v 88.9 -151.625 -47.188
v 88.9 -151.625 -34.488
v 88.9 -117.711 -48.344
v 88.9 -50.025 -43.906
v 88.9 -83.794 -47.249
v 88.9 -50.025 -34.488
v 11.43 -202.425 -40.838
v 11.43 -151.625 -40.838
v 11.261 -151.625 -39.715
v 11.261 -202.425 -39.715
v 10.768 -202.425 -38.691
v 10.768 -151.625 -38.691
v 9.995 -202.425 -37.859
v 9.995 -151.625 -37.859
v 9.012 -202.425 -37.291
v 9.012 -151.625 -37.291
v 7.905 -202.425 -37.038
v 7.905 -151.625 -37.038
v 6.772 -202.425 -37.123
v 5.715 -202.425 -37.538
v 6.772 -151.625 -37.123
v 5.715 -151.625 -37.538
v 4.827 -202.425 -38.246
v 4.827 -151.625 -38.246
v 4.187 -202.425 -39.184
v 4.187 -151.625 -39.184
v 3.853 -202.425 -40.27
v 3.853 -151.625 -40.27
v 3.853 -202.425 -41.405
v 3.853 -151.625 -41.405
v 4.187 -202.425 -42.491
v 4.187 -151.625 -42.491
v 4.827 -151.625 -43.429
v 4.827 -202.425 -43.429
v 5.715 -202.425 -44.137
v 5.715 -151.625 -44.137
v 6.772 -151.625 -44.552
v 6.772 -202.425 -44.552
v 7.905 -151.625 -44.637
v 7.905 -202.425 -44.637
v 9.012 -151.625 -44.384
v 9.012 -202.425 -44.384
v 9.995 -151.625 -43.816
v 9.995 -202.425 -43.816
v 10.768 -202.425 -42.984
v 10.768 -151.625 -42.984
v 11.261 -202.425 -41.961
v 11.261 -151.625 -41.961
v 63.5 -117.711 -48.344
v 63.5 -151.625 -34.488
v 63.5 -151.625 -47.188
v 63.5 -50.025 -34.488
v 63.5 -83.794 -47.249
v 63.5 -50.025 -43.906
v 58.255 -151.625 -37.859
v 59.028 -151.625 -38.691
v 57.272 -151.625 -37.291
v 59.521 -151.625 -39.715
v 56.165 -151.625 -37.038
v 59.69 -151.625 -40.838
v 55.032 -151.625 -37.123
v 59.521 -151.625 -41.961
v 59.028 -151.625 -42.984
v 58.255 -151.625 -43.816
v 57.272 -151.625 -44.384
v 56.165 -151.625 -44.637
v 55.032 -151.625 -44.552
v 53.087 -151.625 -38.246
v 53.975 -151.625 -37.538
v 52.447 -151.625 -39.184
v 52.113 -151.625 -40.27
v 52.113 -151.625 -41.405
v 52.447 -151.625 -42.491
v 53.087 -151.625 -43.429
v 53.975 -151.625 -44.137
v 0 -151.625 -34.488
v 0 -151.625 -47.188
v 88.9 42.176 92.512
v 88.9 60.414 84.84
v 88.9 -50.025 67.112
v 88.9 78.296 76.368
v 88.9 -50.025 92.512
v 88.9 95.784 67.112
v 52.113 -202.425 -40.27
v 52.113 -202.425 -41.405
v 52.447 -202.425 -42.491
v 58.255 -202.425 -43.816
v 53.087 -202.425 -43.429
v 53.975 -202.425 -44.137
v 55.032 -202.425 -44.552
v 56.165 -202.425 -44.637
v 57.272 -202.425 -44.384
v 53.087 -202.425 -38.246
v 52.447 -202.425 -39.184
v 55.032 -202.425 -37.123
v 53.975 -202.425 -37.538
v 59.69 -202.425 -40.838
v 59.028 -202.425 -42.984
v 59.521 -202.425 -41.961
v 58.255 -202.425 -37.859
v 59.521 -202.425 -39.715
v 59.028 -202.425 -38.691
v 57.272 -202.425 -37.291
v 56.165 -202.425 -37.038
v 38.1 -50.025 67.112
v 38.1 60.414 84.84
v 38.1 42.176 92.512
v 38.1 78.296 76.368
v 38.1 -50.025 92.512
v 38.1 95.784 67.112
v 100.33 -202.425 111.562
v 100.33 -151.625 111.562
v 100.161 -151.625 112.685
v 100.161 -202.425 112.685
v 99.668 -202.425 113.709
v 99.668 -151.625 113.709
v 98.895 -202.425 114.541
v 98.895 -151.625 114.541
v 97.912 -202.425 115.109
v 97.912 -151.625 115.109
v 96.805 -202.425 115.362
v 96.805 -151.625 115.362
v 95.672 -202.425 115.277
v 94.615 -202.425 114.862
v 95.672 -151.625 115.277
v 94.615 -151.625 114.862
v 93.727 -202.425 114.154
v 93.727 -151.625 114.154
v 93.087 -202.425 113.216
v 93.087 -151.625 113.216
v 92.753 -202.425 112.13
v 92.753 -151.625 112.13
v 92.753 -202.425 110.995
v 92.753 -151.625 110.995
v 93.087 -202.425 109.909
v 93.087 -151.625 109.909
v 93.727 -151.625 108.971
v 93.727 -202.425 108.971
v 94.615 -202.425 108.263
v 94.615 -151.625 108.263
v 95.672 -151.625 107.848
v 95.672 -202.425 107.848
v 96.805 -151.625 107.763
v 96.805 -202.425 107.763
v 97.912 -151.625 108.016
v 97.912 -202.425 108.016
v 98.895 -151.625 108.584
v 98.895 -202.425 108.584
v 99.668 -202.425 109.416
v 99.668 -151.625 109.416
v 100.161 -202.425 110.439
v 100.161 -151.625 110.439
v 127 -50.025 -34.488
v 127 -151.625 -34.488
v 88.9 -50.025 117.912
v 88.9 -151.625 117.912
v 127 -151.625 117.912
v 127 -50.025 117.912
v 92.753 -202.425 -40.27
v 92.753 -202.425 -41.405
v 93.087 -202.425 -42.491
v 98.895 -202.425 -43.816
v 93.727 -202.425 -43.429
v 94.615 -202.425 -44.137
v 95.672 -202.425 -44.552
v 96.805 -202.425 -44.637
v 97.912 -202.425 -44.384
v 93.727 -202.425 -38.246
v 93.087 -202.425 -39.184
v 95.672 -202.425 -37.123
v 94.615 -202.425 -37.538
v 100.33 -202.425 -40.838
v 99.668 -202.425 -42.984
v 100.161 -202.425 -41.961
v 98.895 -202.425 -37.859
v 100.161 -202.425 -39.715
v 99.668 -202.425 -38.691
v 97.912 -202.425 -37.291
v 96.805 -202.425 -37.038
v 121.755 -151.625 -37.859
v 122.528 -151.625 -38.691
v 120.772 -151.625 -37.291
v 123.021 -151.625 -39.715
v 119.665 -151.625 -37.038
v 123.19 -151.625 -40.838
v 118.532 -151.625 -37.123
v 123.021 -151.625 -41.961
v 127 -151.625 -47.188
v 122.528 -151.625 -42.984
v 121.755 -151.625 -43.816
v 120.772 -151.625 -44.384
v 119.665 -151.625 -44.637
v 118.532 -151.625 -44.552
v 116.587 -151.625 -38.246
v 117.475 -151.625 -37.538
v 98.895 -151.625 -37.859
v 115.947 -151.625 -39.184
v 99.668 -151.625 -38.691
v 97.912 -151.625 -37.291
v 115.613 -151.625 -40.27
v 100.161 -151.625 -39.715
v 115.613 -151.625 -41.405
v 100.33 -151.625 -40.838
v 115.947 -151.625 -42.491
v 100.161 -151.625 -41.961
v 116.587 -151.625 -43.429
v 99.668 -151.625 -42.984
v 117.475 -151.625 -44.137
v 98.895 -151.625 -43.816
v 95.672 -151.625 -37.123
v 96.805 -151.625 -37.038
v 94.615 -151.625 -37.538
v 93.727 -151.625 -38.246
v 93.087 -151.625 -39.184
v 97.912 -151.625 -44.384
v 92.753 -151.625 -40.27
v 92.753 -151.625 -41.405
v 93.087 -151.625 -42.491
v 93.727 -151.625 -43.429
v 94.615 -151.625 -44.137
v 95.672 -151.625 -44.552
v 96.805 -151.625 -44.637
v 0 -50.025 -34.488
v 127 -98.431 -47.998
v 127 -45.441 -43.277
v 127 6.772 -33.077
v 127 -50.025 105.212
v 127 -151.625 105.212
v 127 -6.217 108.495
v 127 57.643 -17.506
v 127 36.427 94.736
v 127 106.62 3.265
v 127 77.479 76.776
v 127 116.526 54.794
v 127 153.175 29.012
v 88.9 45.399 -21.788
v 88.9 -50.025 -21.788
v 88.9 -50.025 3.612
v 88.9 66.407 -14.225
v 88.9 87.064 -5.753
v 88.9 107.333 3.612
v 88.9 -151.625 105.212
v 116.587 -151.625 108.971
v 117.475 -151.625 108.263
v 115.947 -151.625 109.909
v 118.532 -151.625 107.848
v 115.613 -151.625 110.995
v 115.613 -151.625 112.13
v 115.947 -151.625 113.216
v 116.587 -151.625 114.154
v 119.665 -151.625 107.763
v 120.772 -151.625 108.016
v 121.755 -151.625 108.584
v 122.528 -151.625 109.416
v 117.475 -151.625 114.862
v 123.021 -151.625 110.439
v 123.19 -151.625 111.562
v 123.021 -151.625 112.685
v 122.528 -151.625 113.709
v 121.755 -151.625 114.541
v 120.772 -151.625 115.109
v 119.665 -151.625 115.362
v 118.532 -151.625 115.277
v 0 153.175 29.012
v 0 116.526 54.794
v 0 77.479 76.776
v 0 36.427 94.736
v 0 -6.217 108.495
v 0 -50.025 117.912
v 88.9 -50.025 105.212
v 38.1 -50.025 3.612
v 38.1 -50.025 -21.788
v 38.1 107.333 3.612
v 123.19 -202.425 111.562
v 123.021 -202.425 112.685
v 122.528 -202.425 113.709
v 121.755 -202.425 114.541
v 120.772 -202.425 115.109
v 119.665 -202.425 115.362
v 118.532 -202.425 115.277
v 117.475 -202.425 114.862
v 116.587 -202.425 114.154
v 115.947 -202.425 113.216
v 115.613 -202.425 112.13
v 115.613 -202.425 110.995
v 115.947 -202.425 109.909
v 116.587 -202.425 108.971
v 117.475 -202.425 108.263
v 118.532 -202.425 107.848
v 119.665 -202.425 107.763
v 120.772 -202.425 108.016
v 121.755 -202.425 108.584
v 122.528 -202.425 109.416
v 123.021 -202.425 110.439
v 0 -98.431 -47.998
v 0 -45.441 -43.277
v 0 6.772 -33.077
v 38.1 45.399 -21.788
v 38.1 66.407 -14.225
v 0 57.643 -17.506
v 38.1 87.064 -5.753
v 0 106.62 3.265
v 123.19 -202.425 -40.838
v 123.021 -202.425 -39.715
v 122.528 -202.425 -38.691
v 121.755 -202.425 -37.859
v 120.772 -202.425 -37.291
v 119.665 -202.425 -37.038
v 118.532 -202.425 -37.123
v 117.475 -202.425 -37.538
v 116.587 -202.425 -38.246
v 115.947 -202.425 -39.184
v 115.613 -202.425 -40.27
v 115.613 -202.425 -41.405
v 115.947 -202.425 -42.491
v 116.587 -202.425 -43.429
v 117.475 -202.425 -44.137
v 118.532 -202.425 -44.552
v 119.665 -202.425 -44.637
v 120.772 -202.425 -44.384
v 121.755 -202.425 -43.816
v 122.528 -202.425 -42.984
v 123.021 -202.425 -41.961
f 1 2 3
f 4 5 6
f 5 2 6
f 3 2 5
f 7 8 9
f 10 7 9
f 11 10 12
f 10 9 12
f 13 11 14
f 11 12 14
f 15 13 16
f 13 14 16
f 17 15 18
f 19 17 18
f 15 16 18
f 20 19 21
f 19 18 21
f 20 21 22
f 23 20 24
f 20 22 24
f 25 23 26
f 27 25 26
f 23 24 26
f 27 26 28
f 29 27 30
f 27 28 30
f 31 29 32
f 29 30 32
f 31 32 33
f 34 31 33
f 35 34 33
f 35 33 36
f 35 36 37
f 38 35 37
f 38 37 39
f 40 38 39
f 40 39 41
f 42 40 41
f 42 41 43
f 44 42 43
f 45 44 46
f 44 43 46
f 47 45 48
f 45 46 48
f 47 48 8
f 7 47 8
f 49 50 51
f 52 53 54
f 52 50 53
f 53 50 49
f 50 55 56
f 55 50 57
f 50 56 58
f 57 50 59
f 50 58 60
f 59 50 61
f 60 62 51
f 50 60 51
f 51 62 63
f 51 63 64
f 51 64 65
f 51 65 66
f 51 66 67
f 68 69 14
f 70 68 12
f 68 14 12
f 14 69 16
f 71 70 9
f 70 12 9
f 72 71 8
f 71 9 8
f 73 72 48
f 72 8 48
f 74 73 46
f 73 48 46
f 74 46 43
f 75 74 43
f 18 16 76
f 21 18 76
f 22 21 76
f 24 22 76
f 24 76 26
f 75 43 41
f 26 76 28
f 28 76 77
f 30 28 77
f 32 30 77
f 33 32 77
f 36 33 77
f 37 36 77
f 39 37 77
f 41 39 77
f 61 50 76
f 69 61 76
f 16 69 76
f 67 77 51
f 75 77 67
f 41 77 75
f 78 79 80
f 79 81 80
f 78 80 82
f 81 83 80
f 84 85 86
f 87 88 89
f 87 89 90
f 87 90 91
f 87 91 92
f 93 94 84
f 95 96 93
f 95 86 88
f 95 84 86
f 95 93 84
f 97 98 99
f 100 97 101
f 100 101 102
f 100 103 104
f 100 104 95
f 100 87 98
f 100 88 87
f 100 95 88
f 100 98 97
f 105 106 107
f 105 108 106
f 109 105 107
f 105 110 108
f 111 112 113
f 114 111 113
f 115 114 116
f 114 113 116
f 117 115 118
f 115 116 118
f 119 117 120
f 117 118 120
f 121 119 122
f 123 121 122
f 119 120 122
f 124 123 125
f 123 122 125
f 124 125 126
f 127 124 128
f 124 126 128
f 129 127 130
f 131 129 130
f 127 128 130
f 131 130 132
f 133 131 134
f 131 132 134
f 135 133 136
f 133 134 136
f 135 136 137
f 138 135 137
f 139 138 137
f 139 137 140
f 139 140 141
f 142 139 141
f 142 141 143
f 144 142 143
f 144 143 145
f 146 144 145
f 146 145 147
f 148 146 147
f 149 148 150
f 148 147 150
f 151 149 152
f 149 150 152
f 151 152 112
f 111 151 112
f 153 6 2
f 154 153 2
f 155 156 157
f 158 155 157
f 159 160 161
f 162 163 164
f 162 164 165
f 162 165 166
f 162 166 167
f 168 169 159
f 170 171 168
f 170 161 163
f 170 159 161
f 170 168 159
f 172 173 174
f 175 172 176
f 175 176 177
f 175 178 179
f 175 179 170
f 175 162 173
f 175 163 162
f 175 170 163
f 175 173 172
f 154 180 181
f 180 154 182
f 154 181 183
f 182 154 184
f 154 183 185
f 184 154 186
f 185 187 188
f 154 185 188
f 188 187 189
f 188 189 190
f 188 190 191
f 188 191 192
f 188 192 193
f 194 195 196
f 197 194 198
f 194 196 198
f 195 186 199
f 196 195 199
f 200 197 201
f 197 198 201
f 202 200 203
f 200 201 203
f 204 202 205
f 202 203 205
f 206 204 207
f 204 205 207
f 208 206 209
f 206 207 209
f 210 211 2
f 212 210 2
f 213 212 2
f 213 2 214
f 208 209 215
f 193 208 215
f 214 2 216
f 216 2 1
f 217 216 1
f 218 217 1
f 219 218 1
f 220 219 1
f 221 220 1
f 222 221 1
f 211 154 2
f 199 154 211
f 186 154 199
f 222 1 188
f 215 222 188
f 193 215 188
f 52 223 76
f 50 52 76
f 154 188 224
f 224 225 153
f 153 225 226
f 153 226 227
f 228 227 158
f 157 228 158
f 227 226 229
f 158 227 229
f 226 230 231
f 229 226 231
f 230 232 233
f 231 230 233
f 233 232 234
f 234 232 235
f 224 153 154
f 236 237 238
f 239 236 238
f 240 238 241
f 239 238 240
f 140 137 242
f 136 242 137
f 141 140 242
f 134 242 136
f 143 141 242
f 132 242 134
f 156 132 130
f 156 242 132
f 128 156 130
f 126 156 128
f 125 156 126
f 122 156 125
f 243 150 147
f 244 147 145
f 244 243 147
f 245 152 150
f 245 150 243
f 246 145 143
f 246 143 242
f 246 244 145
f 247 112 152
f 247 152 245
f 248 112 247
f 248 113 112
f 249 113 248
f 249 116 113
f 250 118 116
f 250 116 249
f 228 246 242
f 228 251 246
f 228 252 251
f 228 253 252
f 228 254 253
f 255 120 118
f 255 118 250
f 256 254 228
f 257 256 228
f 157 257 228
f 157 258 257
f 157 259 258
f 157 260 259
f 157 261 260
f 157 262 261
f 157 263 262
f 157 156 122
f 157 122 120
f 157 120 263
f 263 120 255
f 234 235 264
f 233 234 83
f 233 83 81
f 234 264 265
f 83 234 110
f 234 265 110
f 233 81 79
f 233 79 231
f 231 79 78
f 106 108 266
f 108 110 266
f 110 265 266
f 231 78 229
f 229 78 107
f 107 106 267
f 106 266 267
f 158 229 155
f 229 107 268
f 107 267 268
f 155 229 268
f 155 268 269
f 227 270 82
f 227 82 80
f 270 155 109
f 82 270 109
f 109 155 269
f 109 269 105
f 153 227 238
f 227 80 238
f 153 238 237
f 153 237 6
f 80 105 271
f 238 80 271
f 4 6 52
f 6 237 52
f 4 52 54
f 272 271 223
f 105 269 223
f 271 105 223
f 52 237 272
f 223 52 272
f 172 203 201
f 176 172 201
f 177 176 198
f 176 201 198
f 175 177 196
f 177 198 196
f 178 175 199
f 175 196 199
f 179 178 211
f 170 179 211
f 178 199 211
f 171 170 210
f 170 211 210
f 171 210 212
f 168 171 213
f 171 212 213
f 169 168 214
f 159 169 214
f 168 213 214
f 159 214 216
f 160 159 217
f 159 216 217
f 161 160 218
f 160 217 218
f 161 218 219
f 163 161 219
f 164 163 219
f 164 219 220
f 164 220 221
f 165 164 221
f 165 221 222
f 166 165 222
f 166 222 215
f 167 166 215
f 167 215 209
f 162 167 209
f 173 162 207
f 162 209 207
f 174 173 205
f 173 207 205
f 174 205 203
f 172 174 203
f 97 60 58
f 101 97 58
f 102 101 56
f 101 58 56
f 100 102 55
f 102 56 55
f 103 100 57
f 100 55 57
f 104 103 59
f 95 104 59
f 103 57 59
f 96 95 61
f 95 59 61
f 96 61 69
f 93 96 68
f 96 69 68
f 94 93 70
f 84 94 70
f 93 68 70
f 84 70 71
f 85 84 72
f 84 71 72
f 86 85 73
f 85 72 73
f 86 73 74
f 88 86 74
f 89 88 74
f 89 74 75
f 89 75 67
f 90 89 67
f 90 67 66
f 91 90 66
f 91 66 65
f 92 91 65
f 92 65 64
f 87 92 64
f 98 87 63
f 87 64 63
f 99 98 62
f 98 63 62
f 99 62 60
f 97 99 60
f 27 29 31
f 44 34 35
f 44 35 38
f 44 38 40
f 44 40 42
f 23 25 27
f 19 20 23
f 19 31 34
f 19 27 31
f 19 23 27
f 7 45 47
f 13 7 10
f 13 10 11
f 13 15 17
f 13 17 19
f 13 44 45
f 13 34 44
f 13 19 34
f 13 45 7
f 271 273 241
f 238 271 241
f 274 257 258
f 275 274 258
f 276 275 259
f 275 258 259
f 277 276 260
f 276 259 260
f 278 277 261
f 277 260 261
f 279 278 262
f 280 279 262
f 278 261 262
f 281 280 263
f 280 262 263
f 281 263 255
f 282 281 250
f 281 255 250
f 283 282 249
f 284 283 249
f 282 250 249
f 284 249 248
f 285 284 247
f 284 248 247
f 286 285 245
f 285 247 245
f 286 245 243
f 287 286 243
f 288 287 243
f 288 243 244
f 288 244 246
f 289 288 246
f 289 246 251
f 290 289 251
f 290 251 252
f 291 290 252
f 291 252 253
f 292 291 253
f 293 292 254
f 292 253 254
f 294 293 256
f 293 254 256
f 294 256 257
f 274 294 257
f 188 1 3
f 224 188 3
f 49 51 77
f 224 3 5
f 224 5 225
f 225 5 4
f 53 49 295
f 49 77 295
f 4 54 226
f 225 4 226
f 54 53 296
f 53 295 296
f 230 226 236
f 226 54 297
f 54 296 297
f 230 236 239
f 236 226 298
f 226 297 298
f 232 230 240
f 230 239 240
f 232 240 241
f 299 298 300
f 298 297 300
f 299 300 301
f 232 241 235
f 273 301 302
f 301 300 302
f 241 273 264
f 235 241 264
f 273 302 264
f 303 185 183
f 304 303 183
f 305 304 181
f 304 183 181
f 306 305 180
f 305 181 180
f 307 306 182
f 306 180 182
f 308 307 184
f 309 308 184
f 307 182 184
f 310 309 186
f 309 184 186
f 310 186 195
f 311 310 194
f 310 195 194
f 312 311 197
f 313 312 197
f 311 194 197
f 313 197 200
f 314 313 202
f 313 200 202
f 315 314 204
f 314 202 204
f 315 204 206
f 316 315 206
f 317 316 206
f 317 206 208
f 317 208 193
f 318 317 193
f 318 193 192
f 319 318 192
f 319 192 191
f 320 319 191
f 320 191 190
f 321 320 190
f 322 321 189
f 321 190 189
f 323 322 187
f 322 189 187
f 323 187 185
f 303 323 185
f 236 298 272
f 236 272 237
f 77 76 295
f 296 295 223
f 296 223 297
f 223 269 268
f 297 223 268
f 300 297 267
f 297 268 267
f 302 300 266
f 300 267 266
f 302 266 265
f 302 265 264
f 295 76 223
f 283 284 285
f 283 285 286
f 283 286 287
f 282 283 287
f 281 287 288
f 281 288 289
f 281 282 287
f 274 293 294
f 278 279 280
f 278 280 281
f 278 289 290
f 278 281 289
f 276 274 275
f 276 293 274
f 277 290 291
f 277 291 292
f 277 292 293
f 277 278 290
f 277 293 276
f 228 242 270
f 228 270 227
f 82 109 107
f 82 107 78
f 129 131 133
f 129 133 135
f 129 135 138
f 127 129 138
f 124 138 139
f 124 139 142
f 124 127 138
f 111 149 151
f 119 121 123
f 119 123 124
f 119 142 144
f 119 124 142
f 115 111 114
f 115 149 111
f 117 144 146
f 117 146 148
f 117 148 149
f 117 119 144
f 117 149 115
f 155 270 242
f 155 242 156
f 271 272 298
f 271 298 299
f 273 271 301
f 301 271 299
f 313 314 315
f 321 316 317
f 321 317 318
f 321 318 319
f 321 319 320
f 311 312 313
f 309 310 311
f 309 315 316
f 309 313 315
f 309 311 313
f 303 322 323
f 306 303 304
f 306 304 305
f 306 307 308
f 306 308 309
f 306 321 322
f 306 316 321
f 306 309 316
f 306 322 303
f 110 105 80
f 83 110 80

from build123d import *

# Parameters (mm, degrees)
F1_DEPTH  = 127
F2_W      = 25.4
F2_H      = 101.6
F3_DEPTH  = 25.4
F4_W      = 50.8
F4_H      = 25.4
F5_DEPTH  = 203.2
F6_R      = 3.81
F7_DEPTH  = 50.8
F8_R      = 3.81
F9_DEPTH  = 50.8
F10_W     = 38.1
F10_H     = 12.7
F11_DEPTH = 101.6
F12_R     = 3.81
F13_DEPTH = 50.8


with BuildPart() as f1:
    # F0 (on Right) → F1 (new body)
    with BuildSketch(Plane.YZ):
        with BuildLine():
            Line((-50.025108, 117.912475), (-50.025108, 29.012475))
            Line((-50.025108, 29.012475), (153.174892, 29.012475))
            ThreePointArc((153.174892, 29.012475), (57.178696, 86.271171), (-50.025108, 117.912475))
        make_face()
        with BuildLine():
            Line((153.174892, 29.012475), (-50.025108, 29.012475))
            Line((-50.025108, 29.012475), (-50.025108, -34.487525))
            Line((-50.025108, -34.487525), (-151.625108, -34.487525))
            Line((-151.625108, -34.487525), (-151.625108, -47.187525))
            ThreePointArc((-151.625108, -47.187525), (6.772136, -33.076502), (153.174892, 29.012475))
        make_face()
    extrude(amount=F1_DEPTH)

    # F2 (on face) → F3 (cut)
    with BuildSketch(Plane.XY.offset(-34.487525)):
        with Locations((76.2, -100.825108)):
            Rectangle(F2_W, F2_H)
    extrude(amount=-F3_DEPTH, mode=Mode.SUBTRACT)

    # F4 (on face) → F5 (cut)
    with BuildSketch(Plane.XZ.offset(50.025108)):
        with Locations((63.5, 79.812475)):
            Rectangle(F4_W, F4_H)
        with Locations((63.5, -9.087525)):
            Rectangle(F4_W, F4_H)
    extrude(amount=-F5_DEPTH, mode=Mode.SUBTRACT)

    # F6 (on face) → F7 (join)
    with BuildSketch(Plane.XZ.offset(151.625108)):
        with Locations((96.52, -40.837525)):
            Circle(F6_R)
        with Locations((119.38, -40.837525)):
            Circle(F6_R)
    extrude(amount=F7_DEPTH)

    # F8 (on face) → F9 (join)
    with BuildSketch(Plane.XZ.offset(151.625108)):
        with Locations((7.62, -40.837525)):
            Circle(F8_R)
        with Locations((55.88, -40.837525)):
            Circle(F8_R)
    extrude(amount=F9_DEPTH)

    # F10 (on face) → F11 (join)
    with BuildSketch(Plane.XZ.offset(50.025108)):
        with Locations((107.95, 111.562475)):
            Rectangle(F10_W, F10_H)
    extrude(amount=F11_DEPTH)

    # F12 (on face) → F13 (join)
    with BuildSketch(Plane.XZ.offset(151.625108)):
        with Locations((96.52, 111.562475)):
            Circle(F12_R)
        with Locations((119.38, 111.562475)):
            Circle(F12_R)
    extrude(amount=F13_DEPTH)


solid = f1.part
